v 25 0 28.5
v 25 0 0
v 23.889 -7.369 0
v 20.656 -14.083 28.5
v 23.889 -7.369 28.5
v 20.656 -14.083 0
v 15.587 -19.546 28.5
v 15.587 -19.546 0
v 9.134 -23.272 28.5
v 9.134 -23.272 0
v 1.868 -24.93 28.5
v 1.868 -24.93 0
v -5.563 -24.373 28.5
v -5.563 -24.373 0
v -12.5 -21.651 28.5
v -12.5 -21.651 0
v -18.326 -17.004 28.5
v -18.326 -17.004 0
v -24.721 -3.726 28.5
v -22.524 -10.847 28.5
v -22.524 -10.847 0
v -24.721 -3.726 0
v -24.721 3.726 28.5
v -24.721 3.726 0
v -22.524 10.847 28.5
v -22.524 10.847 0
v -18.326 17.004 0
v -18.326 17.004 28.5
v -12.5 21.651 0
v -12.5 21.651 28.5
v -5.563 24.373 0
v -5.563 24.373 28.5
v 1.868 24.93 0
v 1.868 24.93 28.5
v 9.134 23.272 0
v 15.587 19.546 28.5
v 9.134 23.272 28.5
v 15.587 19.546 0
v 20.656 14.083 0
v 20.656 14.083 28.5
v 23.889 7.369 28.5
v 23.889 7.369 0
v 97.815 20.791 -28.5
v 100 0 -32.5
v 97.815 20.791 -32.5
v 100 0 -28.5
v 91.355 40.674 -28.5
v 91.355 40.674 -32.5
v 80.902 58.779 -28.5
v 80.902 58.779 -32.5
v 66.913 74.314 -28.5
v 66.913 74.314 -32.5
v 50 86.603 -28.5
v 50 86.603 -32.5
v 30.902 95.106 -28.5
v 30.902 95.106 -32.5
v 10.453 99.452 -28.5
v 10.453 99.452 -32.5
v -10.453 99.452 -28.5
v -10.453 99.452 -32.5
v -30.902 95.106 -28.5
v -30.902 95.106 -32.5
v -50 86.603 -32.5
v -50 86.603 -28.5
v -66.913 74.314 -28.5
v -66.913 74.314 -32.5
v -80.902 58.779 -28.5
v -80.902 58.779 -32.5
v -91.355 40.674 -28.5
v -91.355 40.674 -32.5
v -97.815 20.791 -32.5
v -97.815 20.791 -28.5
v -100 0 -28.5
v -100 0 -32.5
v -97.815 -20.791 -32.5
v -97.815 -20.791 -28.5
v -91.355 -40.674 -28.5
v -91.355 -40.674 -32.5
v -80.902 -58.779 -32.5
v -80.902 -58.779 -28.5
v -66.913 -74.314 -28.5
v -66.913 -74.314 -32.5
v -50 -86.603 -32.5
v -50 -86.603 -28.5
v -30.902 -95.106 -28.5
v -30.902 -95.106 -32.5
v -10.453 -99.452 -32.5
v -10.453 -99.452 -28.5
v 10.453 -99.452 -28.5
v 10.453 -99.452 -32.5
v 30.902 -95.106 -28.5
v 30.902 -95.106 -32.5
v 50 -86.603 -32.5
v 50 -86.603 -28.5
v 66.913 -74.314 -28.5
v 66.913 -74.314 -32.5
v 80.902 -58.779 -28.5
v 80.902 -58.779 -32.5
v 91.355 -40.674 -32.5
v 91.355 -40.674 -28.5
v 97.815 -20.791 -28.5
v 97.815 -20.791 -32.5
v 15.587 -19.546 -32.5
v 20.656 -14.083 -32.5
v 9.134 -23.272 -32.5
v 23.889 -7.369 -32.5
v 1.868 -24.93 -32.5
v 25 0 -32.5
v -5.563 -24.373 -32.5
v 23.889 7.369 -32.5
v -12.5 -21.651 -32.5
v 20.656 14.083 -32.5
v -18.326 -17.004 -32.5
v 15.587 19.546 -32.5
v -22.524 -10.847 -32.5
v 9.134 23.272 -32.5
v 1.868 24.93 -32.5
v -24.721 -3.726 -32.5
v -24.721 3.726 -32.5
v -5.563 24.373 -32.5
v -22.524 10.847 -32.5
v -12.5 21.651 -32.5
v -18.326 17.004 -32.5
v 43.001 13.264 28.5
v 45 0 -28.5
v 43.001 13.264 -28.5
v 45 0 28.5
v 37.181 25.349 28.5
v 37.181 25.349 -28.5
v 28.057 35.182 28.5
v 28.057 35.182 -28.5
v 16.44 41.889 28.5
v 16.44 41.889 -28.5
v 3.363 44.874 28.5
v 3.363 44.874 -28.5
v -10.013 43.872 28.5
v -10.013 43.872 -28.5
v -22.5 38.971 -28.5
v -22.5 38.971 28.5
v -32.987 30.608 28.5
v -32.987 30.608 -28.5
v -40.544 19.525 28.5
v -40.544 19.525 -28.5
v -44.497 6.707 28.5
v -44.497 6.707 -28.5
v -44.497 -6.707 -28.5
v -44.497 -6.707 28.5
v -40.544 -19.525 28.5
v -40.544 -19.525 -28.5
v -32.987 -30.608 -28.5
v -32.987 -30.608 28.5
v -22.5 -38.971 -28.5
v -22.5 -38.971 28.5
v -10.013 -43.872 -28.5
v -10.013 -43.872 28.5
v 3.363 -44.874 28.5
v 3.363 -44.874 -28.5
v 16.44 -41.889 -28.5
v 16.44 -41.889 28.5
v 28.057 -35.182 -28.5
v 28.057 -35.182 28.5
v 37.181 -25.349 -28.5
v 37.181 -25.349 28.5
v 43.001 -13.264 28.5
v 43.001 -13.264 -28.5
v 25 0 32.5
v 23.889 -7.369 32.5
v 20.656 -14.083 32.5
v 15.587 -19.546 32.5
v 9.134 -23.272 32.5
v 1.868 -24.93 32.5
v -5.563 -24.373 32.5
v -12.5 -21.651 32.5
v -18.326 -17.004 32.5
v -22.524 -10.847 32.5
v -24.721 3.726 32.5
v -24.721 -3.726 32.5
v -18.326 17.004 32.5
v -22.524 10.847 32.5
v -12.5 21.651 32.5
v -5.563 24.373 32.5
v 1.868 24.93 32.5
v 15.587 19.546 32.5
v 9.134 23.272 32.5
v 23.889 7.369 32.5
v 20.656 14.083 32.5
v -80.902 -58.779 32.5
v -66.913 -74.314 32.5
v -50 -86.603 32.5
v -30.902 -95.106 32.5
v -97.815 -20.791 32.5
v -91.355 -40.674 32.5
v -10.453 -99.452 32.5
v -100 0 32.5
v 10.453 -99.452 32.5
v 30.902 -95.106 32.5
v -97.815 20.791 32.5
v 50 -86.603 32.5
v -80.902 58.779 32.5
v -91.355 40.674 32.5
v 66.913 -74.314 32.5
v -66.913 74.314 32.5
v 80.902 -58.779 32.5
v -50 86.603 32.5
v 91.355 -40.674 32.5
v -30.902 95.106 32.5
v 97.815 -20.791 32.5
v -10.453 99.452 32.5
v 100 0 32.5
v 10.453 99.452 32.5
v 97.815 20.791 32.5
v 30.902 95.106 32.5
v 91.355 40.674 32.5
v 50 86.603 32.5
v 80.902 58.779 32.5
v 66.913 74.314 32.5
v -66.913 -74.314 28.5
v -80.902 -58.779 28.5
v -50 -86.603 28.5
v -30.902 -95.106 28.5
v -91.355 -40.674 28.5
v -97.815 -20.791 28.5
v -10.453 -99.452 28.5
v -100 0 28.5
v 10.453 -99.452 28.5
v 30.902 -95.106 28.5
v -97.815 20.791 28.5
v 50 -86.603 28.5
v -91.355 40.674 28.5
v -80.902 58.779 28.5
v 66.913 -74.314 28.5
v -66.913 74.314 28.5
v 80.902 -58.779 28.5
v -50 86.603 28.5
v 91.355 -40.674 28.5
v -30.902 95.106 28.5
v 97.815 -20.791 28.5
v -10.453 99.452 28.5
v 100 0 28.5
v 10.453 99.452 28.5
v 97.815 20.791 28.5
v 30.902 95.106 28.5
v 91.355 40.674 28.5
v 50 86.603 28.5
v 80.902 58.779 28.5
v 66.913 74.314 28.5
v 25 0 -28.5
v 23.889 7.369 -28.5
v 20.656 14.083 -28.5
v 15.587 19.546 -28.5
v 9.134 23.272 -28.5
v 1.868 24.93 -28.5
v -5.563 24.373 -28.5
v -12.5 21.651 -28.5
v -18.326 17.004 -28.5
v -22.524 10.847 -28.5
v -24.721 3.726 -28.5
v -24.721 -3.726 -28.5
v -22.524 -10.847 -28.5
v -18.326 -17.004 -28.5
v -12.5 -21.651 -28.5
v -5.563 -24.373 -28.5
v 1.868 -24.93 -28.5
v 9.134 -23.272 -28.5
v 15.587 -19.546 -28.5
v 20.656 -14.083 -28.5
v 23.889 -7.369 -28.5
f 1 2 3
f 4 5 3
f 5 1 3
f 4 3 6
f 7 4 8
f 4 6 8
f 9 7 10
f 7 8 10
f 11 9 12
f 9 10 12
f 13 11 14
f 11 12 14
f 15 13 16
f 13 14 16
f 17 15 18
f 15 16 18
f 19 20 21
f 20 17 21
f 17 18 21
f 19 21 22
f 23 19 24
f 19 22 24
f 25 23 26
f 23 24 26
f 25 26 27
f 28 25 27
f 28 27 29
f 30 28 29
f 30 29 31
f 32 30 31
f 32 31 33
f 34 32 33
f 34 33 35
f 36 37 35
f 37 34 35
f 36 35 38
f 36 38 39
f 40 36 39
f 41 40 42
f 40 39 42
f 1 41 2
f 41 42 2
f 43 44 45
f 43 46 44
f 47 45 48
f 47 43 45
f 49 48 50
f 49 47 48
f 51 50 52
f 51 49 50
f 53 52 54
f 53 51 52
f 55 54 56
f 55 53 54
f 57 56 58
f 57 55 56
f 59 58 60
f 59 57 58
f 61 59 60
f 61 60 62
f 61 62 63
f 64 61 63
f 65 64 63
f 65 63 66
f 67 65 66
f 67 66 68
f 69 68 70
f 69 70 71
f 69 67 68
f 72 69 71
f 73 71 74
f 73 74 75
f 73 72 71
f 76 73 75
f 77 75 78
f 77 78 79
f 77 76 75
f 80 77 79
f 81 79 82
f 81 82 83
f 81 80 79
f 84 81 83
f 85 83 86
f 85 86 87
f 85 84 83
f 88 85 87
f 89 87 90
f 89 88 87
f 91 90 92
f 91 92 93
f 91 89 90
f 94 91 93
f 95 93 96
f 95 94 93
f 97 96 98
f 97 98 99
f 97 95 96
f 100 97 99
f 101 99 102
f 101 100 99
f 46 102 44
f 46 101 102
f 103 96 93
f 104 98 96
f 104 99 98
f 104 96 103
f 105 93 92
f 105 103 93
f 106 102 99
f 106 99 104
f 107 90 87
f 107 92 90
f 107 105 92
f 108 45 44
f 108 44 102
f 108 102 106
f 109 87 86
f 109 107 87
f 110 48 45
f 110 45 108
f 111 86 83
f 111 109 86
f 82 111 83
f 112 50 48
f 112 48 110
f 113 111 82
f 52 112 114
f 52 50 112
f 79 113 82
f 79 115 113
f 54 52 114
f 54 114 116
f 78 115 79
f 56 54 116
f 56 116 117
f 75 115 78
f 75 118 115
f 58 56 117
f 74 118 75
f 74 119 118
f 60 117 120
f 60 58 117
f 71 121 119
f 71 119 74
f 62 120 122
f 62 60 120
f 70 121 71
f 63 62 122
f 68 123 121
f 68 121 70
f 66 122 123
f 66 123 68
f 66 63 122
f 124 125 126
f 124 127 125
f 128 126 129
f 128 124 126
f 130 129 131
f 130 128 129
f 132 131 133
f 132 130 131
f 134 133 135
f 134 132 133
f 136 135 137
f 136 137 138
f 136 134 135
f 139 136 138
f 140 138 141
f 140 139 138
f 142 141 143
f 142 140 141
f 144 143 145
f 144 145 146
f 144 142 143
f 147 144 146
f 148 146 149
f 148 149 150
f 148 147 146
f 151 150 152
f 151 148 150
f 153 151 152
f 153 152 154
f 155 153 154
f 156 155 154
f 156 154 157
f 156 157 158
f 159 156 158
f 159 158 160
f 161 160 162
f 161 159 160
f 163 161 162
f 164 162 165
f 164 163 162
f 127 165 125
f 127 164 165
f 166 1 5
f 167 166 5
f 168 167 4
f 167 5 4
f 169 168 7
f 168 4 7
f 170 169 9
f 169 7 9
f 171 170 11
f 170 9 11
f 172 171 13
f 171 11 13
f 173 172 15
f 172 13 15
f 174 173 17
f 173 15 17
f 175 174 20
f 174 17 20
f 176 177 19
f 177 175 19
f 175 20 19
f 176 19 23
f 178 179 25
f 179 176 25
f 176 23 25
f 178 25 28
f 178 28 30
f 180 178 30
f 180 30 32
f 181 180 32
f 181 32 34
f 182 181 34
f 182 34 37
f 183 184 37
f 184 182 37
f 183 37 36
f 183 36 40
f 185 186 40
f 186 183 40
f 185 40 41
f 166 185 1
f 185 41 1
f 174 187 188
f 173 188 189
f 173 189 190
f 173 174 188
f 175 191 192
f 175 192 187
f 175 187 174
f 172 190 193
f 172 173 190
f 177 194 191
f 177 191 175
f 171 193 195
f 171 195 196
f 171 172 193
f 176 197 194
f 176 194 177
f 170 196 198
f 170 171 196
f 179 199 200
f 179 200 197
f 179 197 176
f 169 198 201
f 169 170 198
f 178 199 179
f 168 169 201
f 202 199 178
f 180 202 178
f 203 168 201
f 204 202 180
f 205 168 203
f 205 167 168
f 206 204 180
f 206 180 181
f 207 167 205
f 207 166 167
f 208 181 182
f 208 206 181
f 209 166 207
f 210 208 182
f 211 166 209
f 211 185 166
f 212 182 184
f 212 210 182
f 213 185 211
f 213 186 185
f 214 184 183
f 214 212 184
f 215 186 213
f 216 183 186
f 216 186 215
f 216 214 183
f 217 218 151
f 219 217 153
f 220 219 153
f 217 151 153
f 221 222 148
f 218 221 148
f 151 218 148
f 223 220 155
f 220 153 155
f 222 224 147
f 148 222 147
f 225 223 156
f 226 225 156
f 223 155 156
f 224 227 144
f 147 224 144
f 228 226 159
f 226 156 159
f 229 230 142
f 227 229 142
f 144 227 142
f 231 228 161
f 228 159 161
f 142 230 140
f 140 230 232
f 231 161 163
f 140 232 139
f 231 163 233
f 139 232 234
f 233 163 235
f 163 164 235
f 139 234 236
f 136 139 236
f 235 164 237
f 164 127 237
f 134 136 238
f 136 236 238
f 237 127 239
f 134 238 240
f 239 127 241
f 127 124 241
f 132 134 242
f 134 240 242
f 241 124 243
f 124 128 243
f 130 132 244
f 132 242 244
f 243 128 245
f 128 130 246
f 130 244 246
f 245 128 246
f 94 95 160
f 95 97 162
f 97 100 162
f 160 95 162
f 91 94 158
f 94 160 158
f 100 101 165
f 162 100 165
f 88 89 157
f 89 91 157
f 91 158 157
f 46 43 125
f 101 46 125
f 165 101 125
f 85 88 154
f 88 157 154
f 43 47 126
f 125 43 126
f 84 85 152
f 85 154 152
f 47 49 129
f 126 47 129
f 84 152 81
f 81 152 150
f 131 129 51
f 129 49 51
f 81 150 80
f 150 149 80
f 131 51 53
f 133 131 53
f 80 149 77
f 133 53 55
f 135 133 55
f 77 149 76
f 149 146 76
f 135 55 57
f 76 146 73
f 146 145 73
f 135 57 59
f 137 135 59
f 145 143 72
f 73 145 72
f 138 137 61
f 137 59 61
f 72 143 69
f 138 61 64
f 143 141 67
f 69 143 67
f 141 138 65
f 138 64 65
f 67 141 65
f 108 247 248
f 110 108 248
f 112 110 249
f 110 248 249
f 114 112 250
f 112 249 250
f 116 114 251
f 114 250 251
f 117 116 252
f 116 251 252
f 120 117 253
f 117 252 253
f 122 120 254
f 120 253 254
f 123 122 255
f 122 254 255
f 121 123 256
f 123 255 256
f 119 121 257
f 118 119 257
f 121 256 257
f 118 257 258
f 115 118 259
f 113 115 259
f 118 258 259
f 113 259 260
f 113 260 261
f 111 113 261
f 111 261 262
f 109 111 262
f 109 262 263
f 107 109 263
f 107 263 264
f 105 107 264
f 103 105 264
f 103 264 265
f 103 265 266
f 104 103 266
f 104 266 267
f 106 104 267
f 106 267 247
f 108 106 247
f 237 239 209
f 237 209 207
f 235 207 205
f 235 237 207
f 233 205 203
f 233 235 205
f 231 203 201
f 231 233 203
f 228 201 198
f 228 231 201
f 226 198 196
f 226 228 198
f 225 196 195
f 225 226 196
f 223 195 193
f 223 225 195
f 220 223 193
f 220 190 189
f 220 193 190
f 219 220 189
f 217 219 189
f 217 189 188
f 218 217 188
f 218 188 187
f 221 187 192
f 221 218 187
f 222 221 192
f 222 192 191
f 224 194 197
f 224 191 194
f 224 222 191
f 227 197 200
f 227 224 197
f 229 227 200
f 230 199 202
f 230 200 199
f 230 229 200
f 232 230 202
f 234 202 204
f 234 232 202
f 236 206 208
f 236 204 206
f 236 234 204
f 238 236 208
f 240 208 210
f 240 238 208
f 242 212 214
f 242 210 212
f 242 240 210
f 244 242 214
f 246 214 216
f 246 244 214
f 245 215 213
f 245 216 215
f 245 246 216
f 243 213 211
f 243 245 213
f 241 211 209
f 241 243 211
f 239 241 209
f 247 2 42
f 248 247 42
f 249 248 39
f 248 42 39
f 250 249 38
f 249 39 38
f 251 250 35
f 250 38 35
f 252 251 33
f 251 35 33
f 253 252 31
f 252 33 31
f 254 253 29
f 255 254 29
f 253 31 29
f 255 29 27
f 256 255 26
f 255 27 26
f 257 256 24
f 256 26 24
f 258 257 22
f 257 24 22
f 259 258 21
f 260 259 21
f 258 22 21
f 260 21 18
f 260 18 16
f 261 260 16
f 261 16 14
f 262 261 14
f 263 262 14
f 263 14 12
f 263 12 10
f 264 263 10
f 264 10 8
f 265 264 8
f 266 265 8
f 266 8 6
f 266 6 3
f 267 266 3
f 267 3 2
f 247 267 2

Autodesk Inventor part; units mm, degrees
ref_plane "YZ Plane" through (0, 0, 0) normal (1, 0, 0) x (0, 1, 0)
ref_plane "XZ Plane" through (0, 0, 0) normal (0, 1, 0) x (-1, 0, 0)
ref_plane "XY Plane" through (0, 0, 0) normal (0, 0, 1) x (1, 0, 0)
sketch "Sketch1" plane through (0, 0, 0) normal (0, 0, 1) x (1, 0, 0)
  circle A0 centre (0, 0) radius 25
  circle A1 centre (0, 0) radius 45
  dimension "d0" = 50
  dimension "d1" = 90
extrude "Extrusion1" add sketch "Sketch1" along normal mid plane 57
sketch "Sketch2" plane through (0, 0, 28.5) normal (0, 0, 1) x (1, 0, 0)
  circle A0 centre (0, 0) radius 100
  circle A1 centre (0, 0) radius 25 projected
  dimension "d4" = 200
extrude "Extrusion2" add sketch "Sketch2" along normal blind 4
mirror "Mirror1" about plane through (0, 0, 0) normal (0, 0, 1) of "Extrusion2"
properties part number "filament spool"
